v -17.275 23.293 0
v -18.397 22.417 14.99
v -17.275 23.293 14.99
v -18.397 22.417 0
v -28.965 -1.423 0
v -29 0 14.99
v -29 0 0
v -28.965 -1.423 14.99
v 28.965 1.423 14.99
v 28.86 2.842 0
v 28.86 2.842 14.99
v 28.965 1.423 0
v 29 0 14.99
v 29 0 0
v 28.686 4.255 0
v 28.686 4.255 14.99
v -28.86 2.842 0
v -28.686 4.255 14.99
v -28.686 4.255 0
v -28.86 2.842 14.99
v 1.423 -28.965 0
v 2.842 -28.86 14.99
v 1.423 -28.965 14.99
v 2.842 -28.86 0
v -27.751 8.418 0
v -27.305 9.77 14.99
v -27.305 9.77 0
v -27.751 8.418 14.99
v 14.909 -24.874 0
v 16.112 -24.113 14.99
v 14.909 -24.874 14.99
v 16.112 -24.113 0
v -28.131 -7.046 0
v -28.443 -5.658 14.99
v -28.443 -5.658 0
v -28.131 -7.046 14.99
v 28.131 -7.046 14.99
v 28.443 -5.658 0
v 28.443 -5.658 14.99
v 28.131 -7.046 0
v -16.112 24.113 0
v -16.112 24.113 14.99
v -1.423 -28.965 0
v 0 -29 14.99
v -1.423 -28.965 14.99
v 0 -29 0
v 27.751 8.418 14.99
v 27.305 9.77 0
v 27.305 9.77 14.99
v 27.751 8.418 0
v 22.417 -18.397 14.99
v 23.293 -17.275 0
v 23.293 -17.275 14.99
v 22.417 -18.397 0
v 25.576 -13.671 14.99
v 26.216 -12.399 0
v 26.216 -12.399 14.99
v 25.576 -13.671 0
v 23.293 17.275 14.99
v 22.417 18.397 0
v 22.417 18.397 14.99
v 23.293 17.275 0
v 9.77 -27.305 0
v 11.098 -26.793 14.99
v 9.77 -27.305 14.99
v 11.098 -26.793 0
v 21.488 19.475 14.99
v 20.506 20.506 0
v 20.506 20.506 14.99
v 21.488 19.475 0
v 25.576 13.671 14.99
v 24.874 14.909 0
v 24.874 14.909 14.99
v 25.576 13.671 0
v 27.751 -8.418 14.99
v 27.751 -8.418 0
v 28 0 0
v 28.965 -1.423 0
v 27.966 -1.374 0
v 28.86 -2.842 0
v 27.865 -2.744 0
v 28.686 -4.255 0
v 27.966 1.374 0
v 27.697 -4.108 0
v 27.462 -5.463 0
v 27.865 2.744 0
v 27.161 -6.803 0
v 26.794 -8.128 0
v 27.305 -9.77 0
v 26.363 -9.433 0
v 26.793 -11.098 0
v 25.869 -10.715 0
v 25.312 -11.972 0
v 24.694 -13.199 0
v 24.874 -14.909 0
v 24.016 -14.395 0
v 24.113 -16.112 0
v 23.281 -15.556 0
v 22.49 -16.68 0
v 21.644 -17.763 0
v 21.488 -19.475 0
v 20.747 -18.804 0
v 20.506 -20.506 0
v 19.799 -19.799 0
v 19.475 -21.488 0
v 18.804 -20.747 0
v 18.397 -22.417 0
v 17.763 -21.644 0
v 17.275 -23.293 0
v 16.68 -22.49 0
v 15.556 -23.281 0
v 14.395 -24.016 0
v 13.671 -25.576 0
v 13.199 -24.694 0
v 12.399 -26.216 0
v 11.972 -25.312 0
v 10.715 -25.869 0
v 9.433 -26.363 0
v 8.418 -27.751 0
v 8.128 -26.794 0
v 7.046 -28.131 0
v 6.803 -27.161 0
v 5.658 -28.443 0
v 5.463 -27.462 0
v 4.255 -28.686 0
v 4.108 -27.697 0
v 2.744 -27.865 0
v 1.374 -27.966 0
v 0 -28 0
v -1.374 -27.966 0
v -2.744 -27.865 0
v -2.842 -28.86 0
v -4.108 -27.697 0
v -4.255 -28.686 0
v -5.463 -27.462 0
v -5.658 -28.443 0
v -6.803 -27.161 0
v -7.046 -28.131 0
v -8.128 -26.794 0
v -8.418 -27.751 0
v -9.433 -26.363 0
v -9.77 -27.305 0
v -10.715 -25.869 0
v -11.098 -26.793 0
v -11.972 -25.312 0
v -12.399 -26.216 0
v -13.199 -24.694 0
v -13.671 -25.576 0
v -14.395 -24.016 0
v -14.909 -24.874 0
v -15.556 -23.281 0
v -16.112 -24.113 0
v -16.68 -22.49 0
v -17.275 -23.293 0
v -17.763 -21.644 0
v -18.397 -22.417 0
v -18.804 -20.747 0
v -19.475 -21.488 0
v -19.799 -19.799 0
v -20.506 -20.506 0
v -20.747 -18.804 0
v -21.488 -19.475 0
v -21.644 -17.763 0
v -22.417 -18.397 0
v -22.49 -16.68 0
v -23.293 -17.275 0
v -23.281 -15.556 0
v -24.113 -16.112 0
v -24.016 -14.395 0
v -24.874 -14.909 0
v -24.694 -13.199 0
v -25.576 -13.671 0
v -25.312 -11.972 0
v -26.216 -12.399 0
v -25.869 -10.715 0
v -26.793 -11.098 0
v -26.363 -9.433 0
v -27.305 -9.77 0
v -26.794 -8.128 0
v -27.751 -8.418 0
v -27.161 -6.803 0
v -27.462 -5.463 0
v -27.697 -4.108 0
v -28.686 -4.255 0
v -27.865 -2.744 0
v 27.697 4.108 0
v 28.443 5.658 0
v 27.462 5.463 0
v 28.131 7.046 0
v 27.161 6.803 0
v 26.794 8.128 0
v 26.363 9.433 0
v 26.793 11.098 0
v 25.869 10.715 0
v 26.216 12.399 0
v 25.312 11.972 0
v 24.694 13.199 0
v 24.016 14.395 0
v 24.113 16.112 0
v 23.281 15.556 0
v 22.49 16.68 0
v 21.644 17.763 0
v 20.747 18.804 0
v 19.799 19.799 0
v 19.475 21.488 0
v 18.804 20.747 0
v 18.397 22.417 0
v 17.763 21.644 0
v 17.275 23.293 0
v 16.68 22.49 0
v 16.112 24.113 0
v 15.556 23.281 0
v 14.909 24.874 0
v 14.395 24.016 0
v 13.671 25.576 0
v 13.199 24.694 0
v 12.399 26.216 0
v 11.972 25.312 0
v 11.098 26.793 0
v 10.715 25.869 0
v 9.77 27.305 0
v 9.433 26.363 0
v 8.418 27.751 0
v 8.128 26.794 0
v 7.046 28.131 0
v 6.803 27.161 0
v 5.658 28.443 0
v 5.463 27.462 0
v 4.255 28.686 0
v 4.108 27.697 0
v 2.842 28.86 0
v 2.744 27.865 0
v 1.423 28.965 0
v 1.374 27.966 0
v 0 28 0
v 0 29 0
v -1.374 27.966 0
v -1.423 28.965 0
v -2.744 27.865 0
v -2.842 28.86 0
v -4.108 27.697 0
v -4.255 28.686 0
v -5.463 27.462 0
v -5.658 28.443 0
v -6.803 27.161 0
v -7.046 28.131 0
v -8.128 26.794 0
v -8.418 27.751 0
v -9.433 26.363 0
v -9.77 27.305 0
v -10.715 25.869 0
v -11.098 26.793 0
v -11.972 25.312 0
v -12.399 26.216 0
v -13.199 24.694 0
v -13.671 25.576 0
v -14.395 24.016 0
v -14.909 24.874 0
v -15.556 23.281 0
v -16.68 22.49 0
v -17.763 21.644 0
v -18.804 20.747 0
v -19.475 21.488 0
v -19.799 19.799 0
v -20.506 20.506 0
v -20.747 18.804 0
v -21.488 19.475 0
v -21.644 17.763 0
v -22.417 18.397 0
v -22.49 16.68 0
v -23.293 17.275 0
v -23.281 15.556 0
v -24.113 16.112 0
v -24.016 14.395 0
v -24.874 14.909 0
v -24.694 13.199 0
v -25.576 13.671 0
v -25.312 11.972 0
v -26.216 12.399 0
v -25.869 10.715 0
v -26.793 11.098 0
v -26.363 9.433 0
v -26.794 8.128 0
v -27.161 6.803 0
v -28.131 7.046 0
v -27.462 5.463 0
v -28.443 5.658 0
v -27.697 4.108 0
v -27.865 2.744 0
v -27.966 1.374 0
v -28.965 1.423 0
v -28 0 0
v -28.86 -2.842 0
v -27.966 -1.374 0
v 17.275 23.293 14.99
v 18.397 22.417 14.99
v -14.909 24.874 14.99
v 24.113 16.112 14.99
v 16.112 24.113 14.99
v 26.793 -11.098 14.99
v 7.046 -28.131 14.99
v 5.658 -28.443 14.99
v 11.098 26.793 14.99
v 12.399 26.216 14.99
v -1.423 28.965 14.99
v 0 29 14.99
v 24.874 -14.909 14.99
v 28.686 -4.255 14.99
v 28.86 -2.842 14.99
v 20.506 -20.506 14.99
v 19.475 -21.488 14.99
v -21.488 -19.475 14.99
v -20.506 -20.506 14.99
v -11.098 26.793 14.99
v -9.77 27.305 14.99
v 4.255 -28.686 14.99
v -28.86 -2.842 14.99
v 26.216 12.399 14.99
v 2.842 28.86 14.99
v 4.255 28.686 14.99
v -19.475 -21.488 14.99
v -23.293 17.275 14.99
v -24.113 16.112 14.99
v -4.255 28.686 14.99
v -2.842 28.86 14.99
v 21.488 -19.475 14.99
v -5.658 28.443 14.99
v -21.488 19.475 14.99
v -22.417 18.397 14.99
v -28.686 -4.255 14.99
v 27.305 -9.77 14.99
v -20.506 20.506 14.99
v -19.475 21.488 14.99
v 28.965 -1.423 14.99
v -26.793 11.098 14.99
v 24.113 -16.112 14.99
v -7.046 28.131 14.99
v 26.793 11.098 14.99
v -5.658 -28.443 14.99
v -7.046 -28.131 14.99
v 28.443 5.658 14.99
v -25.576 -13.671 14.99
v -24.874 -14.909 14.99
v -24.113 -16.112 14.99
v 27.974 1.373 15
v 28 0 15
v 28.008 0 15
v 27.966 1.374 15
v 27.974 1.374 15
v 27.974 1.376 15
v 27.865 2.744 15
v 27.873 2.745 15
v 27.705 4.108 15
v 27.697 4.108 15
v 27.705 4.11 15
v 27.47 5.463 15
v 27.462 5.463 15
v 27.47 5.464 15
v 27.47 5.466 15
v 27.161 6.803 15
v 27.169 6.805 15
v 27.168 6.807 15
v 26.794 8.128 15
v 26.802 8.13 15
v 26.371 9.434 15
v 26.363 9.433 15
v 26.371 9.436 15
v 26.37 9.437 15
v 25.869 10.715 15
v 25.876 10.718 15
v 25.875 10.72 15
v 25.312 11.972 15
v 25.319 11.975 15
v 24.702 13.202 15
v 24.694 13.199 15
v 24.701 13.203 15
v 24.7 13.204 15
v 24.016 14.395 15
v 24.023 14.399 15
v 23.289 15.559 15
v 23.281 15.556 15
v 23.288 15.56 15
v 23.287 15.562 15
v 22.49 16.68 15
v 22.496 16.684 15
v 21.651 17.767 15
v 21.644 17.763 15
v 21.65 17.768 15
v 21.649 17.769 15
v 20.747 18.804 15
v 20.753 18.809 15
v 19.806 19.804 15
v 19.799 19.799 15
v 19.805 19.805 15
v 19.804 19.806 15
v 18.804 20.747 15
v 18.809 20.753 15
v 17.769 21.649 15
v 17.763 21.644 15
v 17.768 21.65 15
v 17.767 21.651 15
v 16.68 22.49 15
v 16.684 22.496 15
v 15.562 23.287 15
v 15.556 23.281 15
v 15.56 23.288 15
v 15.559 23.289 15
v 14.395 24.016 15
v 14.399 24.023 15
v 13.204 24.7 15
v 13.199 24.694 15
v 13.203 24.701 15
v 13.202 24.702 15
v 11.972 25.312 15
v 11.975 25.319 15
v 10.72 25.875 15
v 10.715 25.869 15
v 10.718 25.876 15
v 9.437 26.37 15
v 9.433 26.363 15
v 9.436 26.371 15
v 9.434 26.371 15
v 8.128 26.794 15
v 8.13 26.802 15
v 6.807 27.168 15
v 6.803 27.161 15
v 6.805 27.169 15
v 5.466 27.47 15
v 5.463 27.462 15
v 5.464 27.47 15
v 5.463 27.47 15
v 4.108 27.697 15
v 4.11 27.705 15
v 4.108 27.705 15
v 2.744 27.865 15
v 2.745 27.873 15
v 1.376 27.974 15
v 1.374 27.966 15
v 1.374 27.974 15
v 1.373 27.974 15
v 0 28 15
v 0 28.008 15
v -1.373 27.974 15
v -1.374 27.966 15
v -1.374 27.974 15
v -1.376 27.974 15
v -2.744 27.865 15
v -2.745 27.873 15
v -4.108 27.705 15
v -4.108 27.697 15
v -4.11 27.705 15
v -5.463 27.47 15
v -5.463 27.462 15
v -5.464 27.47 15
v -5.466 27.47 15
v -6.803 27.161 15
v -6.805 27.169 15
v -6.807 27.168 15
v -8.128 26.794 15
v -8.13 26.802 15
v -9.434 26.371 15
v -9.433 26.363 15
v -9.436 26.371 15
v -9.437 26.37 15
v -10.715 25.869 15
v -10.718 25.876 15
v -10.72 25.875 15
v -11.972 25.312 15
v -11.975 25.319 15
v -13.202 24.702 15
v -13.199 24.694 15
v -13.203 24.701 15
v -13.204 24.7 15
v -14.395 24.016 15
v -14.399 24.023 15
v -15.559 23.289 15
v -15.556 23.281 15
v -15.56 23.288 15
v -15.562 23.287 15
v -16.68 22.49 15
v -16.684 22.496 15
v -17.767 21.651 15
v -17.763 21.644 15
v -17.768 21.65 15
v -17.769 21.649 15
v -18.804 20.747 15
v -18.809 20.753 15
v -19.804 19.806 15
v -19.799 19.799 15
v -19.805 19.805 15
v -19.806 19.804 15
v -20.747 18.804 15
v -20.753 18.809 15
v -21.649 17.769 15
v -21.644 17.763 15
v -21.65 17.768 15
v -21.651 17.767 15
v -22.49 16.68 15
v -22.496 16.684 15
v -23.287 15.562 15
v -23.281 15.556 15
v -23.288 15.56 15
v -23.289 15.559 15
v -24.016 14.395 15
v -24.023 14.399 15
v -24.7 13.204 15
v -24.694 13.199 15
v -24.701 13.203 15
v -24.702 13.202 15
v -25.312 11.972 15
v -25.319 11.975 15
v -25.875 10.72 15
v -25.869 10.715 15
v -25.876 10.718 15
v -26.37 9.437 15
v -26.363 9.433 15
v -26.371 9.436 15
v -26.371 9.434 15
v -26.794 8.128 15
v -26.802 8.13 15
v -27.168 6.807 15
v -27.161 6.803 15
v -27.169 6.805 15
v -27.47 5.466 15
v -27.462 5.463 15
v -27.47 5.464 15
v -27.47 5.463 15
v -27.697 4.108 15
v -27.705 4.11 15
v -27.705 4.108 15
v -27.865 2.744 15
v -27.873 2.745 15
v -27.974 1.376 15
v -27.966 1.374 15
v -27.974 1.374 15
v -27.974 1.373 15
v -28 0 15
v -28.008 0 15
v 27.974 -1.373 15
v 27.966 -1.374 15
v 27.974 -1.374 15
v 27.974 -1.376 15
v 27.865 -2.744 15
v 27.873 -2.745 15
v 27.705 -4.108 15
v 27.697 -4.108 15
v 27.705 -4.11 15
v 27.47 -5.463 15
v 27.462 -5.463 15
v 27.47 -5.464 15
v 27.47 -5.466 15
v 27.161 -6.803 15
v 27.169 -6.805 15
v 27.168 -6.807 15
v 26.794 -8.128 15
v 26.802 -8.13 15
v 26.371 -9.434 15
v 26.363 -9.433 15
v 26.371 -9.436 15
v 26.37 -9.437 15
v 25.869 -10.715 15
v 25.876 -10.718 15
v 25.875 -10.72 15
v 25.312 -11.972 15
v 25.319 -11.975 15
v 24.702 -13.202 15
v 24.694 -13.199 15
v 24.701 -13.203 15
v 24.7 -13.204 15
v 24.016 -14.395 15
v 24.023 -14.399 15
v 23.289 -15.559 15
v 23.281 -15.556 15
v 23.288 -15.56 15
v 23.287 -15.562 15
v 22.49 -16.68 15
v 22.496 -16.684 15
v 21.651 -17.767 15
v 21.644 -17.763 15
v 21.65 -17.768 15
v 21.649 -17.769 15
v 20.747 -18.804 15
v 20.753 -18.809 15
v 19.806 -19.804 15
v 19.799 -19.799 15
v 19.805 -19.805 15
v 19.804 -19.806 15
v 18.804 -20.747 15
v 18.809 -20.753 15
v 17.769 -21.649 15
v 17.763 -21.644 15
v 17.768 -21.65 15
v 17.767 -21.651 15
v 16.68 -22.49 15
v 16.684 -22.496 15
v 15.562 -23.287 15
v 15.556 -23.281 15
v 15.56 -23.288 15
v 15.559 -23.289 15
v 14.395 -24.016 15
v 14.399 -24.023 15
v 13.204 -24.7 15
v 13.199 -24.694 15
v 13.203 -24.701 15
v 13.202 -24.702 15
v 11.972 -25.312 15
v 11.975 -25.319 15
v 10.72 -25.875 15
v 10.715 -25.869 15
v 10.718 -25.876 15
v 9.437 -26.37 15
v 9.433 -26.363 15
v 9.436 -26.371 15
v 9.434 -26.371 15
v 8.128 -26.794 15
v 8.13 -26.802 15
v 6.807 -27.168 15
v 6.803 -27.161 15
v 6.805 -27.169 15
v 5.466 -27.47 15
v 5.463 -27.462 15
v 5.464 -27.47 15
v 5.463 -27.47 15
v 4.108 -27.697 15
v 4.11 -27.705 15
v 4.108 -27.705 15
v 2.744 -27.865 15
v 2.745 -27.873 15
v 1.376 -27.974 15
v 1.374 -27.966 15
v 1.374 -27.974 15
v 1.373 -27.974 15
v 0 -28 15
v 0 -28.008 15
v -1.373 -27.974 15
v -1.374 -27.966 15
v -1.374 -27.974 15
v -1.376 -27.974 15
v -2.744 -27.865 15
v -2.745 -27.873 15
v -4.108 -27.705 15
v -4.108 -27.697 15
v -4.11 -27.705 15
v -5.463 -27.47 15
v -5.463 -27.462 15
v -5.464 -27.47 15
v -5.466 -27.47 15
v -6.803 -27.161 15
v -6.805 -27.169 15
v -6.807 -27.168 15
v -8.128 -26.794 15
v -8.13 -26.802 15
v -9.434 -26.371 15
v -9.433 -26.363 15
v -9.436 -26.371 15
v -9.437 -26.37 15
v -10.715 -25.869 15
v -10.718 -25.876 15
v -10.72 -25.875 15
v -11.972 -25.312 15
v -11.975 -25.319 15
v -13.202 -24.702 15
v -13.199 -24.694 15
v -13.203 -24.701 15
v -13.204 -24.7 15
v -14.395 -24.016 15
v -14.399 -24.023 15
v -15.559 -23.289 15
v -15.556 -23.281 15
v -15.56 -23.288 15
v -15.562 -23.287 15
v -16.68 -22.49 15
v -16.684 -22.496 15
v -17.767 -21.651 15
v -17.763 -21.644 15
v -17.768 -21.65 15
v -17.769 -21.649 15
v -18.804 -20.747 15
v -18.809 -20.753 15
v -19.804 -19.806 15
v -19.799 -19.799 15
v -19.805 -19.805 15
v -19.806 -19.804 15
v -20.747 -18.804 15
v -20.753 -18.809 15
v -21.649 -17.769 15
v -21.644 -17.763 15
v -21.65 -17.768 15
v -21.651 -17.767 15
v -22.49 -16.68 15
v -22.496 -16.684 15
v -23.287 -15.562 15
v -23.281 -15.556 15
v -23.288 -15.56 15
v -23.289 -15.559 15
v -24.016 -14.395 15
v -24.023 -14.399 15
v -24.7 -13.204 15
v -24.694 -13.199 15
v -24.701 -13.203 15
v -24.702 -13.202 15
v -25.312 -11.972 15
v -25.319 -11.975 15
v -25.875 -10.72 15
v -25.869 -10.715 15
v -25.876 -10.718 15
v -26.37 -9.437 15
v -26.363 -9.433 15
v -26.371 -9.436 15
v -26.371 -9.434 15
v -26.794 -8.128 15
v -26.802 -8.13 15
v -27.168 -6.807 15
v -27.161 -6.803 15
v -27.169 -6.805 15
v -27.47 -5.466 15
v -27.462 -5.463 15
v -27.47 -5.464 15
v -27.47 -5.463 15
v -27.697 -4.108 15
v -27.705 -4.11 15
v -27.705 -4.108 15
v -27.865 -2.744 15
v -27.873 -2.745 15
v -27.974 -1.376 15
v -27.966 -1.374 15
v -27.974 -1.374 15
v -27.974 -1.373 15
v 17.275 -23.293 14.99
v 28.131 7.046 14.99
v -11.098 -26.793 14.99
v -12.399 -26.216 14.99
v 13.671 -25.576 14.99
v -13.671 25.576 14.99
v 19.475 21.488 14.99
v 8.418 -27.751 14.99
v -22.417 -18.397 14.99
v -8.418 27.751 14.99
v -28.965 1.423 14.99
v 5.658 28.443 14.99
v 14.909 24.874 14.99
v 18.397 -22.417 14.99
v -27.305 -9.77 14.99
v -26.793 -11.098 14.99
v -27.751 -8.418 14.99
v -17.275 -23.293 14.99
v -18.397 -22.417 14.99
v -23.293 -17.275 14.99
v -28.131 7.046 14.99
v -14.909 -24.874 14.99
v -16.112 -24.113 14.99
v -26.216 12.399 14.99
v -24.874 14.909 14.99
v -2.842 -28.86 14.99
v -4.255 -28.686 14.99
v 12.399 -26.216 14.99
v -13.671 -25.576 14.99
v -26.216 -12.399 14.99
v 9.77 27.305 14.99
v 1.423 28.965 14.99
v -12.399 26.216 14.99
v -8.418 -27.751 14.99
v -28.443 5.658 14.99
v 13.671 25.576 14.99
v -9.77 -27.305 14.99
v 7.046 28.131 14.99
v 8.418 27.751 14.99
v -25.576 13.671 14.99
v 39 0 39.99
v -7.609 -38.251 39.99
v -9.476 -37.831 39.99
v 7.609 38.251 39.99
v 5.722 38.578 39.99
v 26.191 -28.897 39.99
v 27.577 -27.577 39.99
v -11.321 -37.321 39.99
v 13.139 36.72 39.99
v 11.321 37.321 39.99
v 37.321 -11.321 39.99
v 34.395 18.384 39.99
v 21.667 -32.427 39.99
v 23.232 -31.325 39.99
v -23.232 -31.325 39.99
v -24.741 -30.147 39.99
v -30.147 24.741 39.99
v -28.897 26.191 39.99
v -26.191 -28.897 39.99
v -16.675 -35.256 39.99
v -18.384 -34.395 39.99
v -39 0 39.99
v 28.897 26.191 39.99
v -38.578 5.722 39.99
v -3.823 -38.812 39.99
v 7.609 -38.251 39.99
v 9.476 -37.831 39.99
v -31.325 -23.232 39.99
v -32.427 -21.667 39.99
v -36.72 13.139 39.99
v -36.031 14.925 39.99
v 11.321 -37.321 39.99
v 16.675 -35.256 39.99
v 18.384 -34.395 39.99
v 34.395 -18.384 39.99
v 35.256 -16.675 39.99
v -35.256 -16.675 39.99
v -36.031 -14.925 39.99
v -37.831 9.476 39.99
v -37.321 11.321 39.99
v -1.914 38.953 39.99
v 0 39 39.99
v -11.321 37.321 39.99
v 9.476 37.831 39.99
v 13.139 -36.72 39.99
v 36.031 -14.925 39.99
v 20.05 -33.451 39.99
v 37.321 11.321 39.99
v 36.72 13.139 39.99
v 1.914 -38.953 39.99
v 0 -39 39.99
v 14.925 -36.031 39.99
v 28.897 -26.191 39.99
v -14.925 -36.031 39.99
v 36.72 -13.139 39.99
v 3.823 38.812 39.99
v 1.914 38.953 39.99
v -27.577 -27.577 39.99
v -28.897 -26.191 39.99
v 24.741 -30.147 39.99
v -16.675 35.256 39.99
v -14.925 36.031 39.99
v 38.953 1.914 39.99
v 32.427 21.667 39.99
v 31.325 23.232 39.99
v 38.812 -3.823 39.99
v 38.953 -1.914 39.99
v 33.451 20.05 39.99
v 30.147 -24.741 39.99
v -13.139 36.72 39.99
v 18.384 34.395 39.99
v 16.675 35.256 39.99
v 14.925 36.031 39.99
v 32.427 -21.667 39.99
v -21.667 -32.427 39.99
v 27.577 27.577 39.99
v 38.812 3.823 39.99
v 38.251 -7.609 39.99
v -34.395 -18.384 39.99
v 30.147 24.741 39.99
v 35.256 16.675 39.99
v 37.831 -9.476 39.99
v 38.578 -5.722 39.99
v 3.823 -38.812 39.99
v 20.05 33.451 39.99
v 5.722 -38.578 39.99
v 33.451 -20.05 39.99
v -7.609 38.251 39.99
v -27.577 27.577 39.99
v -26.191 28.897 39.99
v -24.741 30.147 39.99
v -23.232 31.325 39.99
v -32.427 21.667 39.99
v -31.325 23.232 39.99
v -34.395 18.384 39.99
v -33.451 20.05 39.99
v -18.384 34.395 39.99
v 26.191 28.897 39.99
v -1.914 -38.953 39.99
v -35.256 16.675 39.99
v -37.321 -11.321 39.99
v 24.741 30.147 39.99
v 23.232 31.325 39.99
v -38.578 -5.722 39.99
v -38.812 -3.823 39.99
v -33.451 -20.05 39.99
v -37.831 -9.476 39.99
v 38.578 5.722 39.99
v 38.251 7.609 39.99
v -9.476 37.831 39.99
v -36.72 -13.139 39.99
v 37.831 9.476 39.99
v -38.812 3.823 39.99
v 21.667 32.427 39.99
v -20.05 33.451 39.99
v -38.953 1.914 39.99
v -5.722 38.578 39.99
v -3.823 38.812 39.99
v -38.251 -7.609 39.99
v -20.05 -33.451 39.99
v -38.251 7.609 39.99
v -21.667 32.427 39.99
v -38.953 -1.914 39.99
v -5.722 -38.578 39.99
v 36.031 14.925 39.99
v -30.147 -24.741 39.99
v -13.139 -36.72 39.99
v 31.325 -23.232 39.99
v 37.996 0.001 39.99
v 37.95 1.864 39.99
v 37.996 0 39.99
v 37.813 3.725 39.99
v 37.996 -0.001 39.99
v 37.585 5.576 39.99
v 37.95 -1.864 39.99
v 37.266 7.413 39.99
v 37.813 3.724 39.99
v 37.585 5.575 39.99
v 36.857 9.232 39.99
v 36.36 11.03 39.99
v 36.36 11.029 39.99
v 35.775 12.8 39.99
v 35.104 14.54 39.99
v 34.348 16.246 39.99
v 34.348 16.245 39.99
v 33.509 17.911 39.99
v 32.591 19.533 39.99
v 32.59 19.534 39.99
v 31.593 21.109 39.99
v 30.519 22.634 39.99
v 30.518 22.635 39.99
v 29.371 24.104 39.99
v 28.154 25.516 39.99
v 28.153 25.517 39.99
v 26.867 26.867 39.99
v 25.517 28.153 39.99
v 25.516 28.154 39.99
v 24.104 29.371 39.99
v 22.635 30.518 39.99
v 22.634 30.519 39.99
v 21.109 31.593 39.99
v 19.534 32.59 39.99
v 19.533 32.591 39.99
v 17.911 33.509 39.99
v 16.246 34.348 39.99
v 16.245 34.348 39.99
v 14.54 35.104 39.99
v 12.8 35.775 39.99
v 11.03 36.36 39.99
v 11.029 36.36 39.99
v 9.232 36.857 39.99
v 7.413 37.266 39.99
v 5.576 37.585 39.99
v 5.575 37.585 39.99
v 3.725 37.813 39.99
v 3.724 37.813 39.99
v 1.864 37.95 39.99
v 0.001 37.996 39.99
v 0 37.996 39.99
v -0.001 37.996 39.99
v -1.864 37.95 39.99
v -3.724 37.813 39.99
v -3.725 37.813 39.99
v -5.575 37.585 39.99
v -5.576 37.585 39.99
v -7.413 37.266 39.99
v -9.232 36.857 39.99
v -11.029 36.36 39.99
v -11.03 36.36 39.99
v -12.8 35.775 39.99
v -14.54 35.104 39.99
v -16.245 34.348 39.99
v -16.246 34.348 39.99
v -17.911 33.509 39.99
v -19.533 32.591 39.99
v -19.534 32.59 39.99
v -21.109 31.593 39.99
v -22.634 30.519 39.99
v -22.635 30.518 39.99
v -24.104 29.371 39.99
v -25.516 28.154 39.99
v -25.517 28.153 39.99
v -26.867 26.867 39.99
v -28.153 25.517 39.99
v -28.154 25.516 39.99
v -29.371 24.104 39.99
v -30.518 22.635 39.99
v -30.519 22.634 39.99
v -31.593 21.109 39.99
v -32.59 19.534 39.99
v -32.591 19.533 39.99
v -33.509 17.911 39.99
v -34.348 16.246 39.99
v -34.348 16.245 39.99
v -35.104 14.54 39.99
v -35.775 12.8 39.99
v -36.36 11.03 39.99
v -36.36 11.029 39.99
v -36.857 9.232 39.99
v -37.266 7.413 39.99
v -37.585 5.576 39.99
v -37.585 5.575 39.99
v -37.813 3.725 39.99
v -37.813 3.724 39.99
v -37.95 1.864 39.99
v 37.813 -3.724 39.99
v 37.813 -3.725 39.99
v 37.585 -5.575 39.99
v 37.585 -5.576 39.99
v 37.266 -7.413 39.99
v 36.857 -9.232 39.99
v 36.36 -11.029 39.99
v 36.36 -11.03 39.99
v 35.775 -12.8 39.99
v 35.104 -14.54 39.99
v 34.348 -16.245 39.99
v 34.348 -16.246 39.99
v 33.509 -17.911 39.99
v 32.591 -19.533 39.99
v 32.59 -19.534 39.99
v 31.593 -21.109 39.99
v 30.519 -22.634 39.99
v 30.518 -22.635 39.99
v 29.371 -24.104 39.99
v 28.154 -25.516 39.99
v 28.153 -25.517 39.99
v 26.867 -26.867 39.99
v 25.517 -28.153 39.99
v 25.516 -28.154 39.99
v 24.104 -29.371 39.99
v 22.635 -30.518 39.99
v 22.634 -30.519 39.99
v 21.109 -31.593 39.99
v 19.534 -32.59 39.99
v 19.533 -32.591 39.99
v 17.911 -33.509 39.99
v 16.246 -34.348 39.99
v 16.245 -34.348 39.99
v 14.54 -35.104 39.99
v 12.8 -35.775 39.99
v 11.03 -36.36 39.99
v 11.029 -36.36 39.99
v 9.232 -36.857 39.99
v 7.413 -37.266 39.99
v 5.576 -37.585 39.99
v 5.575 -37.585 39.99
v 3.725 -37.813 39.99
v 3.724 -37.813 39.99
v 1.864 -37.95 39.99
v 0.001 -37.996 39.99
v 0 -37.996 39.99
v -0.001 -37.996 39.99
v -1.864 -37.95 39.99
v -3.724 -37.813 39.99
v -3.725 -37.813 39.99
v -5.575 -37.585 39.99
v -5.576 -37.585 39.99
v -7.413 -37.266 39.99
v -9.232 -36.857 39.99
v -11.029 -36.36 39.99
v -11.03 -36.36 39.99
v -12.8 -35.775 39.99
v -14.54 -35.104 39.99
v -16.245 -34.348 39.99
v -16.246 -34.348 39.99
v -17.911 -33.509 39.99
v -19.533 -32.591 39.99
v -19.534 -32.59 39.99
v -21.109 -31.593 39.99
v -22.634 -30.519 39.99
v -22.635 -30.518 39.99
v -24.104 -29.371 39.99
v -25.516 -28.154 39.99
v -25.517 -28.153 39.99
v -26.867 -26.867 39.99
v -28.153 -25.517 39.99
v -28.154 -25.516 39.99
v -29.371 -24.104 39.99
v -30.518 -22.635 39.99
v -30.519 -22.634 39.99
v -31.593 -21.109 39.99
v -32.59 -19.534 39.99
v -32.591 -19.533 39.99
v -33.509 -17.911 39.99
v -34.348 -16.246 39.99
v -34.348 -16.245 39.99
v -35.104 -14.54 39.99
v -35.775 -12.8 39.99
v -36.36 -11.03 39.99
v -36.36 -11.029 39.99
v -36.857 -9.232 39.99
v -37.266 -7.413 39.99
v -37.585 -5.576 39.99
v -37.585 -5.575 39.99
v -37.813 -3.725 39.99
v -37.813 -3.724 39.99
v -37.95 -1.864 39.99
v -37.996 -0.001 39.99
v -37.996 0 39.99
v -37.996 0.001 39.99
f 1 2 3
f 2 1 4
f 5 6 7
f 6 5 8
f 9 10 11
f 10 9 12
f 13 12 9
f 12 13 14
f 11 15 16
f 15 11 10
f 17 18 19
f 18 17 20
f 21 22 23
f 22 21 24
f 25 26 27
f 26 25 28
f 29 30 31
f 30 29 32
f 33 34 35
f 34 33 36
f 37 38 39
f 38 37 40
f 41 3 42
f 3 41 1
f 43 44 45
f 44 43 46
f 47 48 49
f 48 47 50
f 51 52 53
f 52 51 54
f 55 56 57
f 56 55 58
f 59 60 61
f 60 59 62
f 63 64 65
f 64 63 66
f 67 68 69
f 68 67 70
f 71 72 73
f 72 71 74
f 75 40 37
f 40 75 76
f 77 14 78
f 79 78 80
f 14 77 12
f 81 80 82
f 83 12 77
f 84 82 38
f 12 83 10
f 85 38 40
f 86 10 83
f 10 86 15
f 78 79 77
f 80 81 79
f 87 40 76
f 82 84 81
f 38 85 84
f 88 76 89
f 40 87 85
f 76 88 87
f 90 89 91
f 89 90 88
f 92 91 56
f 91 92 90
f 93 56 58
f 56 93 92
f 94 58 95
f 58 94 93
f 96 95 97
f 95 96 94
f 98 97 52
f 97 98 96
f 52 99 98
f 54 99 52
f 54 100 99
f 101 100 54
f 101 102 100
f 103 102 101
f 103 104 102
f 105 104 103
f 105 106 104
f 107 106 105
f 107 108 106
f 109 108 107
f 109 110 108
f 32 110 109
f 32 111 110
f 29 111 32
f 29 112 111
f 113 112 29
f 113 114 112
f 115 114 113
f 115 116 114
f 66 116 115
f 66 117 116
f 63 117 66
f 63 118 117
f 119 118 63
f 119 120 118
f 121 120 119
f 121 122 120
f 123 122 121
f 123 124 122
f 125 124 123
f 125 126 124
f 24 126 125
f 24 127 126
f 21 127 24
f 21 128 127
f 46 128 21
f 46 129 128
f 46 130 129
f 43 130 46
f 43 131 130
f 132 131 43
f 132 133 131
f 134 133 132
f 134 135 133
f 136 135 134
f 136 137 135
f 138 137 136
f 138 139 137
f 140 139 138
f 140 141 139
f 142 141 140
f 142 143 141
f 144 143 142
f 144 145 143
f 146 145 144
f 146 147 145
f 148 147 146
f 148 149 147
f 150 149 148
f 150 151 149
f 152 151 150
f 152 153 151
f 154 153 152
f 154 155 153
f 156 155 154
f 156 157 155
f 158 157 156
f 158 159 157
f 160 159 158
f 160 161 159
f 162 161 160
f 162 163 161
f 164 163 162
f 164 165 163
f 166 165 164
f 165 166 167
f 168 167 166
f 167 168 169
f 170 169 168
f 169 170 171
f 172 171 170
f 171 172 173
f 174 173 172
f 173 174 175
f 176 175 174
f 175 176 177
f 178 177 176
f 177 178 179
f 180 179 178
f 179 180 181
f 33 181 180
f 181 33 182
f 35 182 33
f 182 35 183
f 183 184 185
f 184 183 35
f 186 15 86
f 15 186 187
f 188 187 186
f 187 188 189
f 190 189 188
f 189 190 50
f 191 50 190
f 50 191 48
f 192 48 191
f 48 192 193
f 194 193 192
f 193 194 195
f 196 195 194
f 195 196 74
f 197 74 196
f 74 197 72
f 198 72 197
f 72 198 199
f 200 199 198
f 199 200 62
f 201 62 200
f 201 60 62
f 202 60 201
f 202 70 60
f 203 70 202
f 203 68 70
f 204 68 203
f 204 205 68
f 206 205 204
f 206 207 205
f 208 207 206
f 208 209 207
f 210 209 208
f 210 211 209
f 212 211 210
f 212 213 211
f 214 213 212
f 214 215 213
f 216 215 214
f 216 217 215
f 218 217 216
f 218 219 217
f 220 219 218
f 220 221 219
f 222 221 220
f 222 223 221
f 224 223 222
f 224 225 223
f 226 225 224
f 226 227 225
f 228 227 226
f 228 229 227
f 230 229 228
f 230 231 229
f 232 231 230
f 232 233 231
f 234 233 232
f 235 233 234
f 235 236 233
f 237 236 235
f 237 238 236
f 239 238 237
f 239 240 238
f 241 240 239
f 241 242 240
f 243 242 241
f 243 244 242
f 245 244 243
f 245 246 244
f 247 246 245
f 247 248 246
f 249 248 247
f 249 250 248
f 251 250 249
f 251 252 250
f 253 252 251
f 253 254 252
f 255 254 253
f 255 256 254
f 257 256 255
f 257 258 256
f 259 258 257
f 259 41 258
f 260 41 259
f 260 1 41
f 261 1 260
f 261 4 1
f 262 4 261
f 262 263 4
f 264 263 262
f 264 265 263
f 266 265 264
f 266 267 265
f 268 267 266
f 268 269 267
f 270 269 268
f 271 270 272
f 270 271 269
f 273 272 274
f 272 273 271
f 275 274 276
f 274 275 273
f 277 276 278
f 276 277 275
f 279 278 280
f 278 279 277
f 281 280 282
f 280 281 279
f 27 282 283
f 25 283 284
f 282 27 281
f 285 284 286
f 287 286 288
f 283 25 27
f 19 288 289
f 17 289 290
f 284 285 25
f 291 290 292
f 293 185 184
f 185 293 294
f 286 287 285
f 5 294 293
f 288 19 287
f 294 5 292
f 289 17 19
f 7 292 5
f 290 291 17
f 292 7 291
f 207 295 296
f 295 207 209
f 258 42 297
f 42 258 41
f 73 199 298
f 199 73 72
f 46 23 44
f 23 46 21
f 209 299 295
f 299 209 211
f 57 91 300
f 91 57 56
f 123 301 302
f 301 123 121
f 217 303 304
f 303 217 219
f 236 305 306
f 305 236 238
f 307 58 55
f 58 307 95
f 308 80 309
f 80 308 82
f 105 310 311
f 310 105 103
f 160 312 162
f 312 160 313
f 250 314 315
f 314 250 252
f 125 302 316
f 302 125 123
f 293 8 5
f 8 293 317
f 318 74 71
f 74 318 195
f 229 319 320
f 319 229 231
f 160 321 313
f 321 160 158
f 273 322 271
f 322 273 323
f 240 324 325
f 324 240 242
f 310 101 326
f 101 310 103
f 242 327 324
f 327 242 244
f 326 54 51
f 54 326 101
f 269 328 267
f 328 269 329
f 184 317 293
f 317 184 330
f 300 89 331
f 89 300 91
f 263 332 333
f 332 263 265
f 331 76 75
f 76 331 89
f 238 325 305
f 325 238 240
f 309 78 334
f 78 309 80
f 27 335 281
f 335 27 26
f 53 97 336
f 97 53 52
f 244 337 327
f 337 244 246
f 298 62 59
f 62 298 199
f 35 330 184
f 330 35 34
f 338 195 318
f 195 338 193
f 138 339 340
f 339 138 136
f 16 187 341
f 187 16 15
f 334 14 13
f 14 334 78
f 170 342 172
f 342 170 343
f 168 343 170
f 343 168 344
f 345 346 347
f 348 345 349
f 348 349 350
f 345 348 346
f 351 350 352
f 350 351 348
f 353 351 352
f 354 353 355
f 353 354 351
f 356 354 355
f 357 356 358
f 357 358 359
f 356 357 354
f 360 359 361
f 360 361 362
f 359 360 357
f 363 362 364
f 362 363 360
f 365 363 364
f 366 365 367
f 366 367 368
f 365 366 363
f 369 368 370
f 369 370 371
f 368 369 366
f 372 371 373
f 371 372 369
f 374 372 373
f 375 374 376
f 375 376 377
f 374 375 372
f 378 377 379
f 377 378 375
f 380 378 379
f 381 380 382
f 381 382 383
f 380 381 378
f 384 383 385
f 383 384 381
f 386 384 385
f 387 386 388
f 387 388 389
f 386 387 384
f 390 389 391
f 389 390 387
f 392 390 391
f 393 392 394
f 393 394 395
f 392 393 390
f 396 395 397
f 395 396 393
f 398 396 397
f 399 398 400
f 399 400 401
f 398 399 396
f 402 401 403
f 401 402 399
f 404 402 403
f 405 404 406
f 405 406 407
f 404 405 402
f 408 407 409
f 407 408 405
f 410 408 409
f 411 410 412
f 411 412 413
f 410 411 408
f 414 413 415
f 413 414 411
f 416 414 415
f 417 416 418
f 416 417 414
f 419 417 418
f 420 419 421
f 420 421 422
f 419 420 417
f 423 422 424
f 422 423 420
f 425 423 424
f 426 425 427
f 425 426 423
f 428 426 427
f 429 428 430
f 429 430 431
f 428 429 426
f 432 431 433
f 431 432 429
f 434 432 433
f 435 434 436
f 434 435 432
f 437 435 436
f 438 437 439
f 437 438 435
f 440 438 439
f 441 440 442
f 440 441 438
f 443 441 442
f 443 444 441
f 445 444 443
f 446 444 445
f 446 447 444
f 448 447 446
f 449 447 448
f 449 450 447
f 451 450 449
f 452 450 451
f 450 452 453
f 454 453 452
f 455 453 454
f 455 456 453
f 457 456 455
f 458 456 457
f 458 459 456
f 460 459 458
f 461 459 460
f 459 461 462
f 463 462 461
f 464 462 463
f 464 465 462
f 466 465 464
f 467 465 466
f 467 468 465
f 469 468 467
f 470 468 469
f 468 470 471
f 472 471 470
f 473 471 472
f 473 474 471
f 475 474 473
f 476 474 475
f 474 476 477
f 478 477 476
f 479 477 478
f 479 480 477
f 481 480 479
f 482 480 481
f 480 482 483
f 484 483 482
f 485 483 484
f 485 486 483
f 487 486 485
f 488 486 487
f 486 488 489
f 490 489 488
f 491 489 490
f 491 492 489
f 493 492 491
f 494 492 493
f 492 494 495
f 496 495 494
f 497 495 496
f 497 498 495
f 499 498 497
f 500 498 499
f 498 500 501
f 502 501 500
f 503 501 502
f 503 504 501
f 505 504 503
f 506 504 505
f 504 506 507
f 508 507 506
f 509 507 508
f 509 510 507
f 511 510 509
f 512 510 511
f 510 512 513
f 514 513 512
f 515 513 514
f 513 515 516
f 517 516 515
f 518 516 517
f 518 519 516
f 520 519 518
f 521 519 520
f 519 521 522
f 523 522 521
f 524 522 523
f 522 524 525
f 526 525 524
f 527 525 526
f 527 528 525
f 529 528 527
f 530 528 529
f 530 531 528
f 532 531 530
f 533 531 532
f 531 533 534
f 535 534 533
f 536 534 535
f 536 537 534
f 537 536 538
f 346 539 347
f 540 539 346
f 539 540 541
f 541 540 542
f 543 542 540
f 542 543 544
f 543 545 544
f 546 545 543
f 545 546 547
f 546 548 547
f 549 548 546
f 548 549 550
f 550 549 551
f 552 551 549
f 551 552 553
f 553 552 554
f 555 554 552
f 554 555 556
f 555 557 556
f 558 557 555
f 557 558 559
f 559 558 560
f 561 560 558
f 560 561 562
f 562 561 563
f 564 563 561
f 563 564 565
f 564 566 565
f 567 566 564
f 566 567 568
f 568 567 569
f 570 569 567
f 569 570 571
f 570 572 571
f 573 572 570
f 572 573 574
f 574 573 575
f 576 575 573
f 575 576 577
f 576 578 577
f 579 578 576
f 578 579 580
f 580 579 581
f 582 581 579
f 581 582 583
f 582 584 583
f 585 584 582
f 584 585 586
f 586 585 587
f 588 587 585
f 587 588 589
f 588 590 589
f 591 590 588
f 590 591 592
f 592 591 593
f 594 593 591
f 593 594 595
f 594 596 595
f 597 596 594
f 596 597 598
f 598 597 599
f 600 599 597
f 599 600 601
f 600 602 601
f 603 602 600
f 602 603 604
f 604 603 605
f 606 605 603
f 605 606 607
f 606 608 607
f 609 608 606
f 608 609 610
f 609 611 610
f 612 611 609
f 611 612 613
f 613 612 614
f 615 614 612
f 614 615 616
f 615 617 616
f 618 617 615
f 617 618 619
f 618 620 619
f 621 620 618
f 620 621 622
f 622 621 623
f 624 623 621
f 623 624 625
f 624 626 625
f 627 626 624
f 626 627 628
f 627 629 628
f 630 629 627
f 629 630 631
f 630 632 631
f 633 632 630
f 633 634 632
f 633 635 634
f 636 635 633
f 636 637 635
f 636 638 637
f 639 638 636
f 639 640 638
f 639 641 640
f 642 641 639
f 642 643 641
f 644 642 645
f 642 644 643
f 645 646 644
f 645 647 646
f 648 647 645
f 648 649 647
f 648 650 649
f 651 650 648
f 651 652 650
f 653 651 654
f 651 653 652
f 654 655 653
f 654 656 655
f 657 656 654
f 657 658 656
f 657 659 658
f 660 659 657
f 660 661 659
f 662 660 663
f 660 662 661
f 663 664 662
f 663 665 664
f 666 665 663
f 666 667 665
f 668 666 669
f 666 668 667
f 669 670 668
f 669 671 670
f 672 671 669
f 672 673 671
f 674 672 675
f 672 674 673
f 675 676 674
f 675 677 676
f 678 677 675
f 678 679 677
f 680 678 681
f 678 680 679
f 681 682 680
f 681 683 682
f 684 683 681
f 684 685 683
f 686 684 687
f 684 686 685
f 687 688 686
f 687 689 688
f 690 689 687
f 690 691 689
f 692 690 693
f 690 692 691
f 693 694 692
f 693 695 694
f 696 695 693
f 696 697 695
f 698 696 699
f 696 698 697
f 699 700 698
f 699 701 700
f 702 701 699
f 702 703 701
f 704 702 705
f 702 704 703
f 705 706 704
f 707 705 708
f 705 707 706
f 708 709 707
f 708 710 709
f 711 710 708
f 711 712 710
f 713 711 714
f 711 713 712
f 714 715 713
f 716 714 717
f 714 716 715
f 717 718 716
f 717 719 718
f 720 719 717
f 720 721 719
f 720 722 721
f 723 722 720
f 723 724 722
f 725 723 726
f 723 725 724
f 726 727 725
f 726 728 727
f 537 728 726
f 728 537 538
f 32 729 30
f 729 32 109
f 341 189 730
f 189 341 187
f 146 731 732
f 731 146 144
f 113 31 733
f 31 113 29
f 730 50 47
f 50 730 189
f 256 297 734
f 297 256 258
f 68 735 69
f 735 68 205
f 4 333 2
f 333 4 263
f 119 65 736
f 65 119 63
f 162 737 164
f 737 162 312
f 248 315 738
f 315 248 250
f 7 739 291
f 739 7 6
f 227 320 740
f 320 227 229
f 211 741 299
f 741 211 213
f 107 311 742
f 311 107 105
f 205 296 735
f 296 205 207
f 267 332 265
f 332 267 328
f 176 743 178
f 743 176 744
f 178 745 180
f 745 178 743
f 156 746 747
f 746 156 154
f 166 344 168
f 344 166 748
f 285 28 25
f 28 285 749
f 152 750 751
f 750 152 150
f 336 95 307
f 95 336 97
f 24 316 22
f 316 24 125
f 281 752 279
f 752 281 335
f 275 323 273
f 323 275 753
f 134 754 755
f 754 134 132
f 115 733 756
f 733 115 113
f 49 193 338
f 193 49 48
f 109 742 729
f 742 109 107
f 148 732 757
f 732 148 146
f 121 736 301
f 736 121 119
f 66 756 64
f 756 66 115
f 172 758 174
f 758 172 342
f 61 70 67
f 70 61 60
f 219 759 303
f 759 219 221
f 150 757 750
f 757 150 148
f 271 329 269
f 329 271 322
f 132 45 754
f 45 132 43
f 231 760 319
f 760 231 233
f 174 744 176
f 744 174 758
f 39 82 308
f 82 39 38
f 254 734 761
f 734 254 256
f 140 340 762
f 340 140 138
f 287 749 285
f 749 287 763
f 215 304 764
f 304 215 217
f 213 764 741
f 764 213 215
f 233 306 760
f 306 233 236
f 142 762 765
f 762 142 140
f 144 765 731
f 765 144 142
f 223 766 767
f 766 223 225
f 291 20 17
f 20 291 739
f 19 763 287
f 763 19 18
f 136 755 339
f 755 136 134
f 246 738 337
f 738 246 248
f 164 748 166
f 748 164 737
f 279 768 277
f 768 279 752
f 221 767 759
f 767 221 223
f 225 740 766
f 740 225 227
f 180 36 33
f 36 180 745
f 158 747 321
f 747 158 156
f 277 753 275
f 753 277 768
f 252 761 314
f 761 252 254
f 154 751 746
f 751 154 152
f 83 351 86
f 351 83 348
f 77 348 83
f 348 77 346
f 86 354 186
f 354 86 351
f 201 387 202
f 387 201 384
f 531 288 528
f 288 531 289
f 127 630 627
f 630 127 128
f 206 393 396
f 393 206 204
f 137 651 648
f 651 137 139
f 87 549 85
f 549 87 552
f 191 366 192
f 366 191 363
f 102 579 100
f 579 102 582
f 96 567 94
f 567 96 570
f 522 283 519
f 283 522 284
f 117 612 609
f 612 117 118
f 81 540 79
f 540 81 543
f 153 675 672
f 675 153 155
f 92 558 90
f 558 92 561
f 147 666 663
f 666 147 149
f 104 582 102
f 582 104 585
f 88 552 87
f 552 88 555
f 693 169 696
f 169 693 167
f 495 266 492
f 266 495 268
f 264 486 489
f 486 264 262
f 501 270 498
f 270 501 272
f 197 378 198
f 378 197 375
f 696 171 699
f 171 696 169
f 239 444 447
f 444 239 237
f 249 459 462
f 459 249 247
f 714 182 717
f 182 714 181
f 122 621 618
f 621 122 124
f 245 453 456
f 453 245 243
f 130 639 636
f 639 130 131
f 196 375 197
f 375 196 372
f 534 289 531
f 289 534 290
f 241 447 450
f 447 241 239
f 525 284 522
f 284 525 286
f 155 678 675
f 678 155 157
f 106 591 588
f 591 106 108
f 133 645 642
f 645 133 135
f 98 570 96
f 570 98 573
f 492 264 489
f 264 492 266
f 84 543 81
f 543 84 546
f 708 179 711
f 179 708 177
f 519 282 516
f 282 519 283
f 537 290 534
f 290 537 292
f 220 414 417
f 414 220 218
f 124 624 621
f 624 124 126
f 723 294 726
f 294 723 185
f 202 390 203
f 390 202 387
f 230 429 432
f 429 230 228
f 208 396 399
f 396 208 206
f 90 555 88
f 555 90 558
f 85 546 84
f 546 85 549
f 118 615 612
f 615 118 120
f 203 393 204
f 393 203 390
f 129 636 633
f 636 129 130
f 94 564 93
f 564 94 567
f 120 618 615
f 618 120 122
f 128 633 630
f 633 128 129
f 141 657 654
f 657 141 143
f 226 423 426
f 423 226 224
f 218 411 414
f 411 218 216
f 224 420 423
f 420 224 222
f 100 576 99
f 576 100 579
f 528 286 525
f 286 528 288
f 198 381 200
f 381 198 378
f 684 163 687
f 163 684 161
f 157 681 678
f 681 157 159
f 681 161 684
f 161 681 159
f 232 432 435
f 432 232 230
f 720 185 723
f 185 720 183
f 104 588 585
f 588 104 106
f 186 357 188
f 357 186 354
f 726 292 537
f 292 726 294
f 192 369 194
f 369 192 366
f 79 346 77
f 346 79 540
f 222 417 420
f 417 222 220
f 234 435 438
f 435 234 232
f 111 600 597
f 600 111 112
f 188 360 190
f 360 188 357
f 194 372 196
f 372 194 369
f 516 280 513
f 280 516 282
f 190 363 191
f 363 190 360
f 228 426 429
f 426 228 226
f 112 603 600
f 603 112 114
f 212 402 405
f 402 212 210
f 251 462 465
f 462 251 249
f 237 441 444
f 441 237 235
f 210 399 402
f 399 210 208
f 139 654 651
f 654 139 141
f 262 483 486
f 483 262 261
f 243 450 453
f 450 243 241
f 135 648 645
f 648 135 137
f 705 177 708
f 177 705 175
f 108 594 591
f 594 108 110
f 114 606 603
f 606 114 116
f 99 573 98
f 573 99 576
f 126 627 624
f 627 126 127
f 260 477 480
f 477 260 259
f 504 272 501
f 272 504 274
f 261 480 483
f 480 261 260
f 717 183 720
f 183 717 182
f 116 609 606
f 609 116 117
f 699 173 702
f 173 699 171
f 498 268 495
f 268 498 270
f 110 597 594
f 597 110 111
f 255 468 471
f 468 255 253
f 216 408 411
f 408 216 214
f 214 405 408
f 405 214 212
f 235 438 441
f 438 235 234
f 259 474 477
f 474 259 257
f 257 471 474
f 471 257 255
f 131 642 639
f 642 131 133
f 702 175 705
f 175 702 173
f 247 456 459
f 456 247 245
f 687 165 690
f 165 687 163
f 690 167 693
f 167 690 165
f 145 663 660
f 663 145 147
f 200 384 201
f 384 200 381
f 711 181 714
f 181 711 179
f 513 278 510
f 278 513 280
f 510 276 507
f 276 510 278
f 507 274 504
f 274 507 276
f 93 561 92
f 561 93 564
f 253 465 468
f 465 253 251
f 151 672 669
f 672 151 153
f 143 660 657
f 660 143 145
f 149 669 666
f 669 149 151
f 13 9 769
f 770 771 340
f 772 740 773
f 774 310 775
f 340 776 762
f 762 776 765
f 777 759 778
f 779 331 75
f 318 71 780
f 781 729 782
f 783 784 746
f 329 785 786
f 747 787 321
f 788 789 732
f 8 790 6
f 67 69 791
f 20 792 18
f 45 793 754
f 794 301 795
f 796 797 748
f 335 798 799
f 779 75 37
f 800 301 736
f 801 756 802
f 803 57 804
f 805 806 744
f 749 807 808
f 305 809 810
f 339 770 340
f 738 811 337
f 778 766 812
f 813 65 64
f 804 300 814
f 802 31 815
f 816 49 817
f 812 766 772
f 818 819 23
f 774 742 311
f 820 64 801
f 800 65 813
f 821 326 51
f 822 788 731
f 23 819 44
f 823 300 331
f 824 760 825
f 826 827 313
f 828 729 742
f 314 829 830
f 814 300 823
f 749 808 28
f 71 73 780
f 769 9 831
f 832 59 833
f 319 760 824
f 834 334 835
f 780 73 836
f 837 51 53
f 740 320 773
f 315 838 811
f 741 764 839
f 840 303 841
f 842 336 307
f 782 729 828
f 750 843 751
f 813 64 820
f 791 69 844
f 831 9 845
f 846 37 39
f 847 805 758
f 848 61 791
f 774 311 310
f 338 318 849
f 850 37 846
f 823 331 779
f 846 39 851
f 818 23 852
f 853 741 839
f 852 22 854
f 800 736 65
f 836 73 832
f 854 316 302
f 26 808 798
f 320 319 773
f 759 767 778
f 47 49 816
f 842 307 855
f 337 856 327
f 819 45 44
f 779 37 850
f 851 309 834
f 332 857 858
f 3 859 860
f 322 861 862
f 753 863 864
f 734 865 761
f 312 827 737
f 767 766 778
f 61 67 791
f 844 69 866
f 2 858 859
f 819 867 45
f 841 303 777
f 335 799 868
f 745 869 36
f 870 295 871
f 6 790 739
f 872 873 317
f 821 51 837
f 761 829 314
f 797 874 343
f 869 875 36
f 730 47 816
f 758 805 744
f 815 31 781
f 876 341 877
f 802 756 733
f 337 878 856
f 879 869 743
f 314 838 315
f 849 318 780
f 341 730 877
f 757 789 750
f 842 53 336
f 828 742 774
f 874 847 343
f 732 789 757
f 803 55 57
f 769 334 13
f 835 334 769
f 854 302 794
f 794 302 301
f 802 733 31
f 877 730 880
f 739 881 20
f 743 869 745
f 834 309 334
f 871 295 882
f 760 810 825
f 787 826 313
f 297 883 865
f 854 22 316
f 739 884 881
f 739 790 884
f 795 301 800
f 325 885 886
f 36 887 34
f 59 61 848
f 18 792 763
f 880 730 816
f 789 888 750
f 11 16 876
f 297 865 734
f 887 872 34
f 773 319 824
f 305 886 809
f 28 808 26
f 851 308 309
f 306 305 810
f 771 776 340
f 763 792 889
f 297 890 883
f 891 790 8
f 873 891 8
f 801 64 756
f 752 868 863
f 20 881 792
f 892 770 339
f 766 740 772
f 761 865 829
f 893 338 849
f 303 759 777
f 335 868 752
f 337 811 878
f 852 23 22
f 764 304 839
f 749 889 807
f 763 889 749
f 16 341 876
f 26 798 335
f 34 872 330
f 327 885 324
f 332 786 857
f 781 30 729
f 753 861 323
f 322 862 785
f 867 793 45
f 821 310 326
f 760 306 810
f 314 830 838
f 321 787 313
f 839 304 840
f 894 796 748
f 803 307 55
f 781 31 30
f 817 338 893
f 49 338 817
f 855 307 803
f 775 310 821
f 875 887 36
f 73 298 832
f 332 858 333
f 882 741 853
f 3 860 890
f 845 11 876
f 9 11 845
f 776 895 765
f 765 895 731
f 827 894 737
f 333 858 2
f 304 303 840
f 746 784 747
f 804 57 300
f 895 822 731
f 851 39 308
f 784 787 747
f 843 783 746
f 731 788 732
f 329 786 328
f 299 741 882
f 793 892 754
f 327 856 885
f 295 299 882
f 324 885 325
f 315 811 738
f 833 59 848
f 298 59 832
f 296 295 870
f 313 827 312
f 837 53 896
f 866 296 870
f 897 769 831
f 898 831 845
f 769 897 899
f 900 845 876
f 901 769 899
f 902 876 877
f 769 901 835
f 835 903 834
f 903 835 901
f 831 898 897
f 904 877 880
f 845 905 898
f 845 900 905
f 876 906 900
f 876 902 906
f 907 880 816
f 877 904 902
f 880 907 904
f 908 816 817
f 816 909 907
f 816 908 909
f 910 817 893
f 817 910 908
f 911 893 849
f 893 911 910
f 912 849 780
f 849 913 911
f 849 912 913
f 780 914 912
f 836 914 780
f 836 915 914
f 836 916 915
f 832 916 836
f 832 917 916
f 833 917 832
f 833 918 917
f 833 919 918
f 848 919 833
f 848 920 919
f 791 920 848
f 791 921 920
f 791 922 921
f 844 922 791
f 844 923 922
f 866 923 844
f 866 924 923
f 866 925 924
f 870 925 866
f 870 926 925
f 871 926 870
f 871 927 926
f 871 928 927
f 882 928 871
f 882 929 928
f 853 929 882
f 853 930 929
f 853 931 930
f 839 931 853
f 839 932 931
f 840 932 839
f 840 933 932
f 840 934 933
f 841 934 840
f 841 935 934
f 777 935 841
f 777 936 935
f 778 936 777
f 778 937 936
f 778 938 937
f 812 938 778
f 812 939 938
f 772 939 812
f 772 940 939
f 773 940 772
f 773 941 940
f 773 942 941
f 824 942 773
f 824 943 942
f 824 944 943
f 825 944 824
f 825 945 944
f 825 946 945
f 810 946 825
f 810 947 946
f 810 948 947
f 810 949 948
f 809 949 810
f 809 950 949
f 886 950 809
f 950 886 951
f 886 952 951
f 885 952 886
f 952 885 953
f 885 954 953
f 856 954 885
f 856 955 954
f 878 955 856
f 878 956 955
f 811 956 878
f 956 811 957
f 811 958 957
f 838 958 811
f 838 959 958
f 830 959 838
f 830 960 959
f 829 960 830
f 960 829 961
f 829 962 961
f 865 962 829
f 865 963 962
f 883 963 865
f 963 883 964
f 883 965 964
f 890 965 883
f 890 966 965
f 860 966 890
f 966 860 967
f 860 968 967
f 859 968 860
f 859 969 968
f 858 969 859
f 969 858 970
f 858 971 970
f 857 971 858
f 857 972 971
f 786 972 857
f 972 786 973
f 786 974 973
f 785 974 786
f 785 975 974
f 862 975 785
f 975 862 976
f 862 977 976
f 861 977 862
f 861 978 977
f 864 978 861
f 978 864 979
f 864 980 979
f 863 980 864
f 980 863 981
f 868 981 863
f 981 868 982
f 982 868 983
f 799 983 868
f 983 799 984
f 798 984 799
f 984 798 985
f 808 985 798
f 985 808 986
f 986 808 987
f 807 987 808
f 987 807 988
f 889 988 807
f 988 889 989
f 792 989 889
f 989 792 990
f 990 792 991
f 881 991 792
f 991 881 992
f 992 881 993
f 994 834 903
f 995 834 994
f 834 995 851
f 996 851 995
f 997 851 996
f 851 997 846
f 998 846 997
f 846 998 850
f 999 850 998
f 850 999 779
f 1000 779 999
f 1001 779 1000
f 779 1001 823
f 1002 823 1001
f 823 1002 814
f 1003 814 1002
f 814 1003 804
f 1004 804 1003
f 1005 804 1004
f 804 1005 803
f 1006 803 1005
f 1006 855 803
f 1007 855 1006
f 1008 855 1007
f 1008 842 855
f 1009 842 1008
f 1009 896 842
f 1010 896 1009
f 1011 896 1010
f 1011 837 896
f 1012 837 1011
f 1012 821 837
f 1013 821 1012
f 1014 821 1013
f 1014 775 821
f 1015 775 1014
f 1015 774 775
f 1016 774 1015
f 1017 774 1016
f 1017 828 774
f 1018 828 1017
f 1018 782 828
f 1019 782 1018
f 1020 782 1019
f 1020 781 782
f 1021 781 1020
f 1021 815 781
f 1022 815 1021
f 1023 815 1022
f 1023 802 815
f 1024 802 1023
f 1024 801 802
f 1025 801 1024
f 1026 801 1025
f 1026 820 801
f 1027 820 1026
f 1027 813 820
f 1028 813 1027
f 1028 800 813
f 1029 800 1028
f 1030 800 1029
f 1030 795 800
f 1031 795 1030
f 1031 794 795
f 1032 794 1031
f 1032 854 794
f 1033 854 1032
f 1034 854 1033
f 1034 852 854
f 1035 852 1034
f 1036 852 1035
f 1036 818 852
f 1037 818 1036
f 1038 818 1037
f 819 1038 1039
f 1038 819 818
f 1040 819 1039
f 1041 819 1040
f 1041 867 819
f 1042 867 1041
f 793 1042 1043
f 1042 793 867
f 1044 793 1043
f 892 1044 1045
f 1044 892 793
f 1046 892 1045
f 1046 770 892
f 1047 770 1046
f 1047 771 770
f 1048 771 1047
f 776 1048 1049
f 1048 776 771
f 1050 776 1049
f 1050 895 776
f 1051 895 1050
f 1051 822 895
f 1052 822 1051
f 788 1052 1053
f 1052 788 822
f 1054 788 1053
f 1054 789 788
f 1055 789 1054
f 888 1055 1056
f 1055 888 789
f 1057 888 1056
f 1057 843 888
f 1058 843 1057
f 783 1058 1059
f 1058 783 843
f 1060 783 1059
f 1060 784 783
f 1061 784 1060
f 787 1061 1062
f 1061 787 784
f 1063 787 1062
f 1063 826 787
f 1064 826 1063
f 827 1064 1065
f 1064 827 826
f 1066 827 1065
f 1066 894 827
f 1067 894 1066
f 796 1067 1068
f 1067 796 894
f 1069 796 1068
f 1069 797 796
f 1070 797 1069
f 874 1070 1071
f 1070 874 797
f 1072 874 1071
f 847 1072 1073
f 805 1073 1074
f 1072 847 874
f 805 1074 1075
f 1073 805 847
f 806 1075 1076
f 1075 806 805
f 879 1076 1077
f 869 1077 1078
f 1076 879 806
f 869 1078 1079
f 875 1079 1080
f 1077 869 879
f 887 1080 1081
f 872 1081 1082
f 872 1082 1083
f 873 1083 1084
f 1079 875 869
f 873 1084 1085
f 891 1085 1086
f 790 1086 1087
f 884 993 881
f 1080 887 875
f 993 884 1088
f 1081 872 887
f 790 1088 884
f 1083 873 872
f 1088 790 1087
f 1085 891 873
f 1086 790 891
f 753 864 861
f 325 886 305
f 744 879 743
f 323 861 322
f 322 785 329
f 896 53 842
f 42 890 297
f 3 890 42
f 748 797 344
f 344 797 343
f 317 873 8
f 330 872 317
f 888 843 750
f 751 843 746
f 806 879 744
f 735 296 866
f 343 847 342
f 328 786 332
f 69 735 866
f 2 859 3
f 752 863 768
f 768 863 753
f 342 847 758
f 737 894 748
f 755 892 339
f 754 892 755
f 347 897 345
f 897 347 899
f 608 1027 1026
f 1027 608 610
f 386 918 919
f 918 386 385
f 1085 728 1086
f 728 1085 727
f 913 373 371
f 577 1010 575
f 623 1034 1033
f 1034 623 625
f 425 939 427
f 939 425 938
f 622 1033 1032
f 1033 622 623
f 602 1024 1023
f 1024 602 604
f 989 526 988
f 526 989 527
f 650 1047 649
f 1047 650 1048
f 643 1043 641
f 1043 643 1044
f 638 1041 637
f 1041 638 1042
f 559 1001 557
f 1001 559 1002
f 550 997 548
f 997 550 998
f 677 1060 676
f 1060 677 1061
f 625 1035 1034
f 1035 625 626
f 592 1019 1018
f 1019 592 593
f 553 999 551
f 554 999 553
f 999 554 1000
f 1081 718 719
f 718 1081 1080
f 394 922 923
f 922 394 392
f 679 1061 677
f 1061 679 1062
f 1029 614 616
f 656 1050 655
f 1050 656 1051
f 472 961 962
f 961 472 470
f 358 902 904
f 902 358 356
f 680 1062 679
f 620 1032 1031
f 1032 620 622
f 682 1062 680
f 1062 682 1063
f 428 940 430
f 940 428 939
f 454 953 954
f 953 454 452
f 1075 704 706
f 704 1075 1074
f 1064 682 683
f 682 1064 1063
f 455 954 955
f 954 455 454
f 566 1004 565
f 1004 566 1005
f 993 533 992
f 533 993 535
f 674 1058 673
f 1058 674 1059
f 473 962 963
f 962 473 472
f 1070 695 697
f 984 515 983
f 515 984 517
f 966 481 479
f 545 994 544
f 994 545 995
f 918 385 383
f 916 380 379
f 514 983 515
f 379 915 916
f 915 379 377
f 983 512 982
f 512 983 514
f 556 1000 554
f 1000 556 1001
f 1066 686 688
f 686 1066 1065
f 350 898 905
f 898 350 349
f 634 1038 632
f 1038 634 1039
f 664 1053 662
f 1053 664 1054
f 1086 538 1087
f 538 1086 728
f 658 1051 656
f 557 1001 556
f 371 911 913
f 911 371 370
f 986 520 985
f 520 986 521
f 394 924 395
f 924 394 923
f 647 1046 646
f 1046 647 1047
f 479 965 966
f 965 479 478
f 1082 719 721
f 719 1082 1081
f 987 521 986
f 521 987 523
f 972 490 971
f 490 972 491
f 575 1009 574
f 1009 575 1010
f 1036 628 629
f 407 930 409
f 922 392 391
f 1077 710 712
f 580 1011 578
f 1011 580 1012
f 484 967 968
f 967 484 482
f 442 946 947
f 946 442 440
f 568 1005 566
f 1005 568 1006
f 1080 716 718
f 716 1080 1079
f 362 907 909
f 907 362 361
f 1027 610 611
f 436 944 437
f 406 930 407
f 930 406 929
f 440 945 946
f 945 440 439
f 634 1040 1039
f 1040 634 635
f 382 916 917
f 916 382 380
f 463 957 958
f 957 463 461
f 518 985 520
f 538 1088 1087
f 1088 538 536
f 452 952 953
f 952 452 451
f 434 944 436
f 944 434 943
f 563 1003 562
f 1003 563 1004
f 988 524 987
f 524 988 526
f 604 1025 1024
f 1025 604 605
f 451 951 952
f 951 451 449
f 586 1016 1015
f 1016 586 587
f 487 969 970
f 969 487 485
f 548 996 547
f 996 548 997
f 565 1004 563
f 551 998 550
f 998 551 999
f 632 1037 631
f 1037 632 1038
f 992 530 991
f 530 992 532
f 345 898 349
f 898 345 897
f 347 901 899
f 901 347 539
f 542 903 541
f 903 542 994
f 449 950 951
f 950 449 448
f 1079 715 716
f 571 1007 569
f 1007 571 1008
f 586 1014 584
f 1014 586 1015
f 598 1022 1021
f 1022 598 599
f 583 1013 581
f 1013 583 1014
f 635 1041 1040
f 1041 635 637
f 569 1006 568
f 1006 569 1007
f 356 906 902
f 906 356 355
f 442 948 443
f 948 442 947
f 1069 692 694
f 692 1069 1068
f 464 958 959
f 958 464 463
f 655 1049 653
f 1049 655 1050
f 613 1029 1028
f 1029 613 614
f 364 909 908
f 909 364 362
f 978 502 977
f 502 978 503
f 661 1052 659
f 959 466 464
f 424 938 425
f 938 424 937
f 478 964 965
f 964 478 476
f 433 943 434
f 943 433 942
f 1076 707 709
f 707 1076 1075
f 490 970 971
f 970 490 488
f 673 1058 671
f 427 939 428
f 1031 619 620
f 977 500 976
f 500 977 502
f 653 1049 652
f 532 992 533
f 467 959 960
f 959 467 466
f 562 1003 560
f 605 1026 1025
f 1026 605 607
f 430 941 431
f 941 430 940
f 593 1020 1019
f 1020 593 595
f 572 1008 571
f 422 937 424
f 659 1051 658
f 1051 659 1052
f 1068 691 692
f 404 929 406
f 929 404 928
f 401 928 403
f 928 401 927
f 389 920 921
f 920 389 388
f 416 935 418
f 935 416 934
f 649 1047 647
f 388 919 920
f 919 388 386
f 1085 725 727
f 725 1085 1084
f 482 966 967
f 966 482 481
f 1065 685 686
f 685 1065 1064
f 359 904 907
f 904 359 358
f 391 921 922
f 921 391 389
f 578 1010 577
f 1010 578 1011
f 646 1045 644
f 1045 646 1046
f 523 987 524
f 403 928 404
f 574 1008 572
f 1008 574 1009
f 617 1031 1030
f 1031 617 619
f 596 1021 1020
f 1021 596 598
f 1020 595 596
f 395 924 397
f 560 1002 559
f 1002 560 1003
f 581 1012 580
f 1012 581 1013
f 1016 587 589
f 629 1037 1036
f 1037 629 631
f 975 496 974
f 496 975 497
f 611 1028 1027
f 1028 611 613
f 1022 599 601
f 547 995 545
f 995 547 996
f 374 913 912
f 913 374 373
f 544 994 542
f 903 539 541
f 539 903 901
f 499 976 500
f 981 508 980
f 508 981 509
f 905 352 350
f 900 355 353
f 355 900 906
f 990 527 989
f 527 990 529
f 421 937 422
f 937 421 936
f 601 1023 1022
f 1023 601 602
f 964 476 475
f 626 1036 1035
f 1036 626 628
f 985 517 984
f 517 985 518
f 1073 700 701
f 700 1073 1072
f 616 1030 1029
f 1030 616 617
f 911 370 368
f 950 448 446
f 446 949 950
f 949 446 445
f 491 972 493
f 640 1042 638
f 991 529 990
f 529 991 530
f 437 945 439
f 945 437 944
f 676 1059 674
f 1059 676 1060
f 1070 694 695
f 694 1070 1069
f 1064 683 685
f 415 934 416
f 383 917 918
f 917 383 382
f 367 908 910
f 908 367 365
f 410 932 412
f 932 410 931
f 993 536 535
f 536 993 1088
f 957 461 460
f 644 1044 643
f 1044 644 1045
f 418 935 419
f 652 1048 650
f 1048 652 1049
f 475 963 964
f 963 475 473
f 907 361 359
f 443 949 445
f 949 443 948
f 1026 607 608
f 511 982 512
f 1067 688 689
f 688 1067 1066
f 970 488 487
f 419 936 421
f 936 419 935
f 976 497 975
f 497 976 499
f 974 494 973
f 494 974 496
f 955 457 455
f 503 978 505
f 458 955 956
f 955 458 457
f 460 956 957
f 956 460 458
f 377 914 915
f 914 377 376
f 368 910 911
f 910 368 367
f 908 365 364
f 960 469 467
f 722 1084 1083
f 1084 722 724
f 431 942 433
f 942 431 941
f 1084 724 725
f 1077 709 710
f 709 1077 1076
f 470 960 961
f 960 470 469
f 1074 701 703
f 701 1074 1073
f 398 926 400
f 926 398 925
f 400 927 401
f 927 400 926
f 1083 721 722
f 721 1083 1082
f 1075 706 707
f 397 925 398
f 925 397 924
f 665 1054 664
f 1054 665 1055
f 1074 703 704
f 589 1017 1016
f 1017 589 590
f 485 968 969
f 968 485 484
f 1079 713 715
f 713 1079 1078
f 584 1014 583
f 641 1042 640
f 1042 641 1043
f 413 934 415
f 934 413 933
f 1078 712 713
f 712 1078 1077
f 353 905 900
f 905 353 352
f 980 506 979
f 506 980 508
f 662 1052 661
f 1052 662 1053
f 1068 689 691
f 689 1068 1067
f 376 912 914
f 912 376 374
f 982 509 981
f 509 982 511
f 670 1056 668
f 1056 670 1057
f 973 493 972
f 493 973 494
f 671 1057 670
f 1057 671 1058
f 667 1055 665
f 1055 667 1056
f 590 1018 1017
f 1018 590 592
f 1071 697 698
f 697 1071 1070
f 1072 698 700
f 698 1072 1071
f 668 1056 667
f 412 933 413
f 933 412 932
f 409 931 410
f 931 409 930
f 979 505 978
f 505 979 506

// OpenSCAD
$fn=128;

r = 29;
baseHeight = 15;
funnelHeight = 25;
funnelR = 10;
wallThickness = 1;
eps = 0.01;

thinCyn(baseHeight,r,r);
translate([0,0,baseHeight-eps]) thinCyn(funnelHeight,r,r+funnelR);

module thinCyn(h,r1,r2){
  difference(){
	  cylinder(h,r1,r2);
	  translate([0,0,-eps])
        cylinder(h+2*eps,r1-wallThickness,r2-wallThickness);
  }
}
